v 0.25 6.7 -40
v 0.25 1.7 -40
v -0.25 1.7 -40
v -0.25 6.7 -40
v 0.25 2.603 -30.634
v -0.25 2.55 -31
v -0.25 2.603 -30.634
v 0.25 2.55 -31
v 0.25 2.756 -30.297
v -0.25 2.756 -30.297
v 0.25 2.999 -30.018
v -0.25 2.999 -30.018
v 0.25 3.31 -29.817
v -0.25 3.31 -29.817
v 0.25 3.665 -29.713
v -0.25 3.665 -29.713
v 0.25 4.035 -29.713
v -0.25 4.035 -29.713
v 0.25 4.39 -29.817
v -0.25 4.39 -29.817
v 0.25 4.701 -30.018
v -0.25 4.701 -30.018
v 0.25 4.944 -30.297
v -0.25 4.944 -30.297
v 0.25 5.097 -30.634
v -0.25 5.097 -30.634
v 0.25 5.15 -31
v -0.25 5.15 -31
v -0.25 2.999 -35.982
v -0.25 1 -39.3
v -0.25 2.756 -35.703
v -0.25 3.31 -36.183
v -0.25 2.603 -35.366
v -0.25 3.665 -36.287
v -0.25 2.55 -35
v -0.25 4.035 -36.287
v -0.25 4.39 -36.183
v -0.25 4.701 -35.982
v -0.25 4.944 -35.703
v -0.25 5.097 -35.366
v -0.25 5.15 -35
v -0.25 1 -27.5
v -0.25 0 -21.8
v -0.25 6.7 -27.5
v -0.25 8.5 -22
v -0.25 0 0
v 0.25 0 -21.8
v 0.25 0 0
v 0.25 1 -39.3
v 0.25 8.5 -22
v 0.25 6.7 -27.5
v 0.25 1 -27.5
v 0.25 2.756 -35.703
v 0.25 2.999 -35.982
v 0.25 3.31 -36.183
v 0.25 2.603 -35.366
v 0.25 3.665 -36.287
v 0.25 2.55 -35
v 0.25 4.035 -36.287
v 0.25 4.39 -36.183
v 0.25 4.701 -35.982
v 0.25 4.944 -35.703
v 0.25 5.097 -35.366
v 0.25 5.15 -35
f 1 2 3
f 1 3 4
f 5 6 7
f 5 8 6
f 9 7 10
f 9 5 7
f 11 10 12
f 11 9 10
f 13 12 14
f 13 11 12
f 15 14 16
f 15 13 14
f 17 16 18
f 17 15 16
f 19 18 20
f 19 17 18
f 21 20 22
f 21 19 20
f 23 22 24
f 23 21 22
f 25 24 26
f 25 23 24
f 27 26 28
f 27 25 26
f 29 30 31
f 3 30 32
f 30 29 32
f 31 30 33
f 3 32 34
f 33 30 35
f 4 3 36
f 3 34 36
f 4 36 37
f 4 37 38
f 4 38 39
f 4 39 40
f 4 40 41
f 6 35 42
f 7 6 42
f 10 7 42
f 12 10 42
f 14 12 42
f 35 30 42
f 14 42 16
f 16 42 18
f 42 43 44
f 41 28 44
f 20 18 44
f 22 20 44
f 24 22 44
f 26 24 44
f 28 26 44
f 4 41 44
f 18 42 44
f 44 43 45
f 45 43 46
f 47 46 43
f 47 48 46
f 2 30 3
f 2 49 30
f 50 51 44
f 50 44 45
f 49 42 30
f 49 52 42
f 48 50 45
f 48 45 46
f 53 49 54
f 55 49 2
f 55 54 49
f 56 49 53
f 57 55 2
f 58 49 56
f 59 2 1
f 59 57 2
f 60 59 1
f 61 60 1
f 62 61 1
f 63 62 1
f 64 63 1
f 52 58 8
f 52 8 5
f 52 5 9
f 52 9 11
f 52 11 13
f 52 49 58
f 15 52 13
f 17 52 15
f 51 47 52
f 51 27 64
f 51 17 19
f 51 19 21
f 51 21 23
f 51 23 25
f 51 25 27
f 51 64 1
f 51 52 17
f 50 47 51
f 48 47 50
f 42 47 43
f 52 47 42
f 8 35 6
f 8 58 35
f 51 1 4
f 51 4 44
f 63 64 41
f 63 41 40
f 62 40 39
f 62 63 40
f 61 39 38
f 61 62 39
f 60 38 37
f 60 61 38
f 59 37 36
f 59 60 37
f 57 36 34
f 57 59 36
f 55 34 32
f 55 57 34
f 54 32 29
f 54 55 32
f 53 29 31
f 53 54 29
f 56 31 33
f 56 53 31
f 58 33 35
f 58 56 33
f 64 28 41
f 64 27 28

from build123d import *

# Parameters (mm, degrees)
F1_DEPTH = 0.25


with BuildPart() as f1:
    # F0 (on Right) → F1 (new body, symmetric)
    with BuildSketch(Plane.YZ):
        Polygon((1, -39.3), (1.7, -40), (6.7, -40), (6.7, -27.5), (8.5, -22), (0, 0), (0, -21.8), (1, -27.5), align=None)
        with BuildLine():
            ThreePointArc((5.15, -35), (3.85, -36.3), (2.55, -35))
            Line((2.55, -35), (2.55, -31))
            ThreePointArc((2.55, -31), (3.85, -29.7), (5.15, -31))
            Line((5.15, -31), (5.15, -35))
        make_face(mode=Mode.SUBTRACT)
    extrude(amount=F1_DEPTH, both=True)


solid = f1.part
